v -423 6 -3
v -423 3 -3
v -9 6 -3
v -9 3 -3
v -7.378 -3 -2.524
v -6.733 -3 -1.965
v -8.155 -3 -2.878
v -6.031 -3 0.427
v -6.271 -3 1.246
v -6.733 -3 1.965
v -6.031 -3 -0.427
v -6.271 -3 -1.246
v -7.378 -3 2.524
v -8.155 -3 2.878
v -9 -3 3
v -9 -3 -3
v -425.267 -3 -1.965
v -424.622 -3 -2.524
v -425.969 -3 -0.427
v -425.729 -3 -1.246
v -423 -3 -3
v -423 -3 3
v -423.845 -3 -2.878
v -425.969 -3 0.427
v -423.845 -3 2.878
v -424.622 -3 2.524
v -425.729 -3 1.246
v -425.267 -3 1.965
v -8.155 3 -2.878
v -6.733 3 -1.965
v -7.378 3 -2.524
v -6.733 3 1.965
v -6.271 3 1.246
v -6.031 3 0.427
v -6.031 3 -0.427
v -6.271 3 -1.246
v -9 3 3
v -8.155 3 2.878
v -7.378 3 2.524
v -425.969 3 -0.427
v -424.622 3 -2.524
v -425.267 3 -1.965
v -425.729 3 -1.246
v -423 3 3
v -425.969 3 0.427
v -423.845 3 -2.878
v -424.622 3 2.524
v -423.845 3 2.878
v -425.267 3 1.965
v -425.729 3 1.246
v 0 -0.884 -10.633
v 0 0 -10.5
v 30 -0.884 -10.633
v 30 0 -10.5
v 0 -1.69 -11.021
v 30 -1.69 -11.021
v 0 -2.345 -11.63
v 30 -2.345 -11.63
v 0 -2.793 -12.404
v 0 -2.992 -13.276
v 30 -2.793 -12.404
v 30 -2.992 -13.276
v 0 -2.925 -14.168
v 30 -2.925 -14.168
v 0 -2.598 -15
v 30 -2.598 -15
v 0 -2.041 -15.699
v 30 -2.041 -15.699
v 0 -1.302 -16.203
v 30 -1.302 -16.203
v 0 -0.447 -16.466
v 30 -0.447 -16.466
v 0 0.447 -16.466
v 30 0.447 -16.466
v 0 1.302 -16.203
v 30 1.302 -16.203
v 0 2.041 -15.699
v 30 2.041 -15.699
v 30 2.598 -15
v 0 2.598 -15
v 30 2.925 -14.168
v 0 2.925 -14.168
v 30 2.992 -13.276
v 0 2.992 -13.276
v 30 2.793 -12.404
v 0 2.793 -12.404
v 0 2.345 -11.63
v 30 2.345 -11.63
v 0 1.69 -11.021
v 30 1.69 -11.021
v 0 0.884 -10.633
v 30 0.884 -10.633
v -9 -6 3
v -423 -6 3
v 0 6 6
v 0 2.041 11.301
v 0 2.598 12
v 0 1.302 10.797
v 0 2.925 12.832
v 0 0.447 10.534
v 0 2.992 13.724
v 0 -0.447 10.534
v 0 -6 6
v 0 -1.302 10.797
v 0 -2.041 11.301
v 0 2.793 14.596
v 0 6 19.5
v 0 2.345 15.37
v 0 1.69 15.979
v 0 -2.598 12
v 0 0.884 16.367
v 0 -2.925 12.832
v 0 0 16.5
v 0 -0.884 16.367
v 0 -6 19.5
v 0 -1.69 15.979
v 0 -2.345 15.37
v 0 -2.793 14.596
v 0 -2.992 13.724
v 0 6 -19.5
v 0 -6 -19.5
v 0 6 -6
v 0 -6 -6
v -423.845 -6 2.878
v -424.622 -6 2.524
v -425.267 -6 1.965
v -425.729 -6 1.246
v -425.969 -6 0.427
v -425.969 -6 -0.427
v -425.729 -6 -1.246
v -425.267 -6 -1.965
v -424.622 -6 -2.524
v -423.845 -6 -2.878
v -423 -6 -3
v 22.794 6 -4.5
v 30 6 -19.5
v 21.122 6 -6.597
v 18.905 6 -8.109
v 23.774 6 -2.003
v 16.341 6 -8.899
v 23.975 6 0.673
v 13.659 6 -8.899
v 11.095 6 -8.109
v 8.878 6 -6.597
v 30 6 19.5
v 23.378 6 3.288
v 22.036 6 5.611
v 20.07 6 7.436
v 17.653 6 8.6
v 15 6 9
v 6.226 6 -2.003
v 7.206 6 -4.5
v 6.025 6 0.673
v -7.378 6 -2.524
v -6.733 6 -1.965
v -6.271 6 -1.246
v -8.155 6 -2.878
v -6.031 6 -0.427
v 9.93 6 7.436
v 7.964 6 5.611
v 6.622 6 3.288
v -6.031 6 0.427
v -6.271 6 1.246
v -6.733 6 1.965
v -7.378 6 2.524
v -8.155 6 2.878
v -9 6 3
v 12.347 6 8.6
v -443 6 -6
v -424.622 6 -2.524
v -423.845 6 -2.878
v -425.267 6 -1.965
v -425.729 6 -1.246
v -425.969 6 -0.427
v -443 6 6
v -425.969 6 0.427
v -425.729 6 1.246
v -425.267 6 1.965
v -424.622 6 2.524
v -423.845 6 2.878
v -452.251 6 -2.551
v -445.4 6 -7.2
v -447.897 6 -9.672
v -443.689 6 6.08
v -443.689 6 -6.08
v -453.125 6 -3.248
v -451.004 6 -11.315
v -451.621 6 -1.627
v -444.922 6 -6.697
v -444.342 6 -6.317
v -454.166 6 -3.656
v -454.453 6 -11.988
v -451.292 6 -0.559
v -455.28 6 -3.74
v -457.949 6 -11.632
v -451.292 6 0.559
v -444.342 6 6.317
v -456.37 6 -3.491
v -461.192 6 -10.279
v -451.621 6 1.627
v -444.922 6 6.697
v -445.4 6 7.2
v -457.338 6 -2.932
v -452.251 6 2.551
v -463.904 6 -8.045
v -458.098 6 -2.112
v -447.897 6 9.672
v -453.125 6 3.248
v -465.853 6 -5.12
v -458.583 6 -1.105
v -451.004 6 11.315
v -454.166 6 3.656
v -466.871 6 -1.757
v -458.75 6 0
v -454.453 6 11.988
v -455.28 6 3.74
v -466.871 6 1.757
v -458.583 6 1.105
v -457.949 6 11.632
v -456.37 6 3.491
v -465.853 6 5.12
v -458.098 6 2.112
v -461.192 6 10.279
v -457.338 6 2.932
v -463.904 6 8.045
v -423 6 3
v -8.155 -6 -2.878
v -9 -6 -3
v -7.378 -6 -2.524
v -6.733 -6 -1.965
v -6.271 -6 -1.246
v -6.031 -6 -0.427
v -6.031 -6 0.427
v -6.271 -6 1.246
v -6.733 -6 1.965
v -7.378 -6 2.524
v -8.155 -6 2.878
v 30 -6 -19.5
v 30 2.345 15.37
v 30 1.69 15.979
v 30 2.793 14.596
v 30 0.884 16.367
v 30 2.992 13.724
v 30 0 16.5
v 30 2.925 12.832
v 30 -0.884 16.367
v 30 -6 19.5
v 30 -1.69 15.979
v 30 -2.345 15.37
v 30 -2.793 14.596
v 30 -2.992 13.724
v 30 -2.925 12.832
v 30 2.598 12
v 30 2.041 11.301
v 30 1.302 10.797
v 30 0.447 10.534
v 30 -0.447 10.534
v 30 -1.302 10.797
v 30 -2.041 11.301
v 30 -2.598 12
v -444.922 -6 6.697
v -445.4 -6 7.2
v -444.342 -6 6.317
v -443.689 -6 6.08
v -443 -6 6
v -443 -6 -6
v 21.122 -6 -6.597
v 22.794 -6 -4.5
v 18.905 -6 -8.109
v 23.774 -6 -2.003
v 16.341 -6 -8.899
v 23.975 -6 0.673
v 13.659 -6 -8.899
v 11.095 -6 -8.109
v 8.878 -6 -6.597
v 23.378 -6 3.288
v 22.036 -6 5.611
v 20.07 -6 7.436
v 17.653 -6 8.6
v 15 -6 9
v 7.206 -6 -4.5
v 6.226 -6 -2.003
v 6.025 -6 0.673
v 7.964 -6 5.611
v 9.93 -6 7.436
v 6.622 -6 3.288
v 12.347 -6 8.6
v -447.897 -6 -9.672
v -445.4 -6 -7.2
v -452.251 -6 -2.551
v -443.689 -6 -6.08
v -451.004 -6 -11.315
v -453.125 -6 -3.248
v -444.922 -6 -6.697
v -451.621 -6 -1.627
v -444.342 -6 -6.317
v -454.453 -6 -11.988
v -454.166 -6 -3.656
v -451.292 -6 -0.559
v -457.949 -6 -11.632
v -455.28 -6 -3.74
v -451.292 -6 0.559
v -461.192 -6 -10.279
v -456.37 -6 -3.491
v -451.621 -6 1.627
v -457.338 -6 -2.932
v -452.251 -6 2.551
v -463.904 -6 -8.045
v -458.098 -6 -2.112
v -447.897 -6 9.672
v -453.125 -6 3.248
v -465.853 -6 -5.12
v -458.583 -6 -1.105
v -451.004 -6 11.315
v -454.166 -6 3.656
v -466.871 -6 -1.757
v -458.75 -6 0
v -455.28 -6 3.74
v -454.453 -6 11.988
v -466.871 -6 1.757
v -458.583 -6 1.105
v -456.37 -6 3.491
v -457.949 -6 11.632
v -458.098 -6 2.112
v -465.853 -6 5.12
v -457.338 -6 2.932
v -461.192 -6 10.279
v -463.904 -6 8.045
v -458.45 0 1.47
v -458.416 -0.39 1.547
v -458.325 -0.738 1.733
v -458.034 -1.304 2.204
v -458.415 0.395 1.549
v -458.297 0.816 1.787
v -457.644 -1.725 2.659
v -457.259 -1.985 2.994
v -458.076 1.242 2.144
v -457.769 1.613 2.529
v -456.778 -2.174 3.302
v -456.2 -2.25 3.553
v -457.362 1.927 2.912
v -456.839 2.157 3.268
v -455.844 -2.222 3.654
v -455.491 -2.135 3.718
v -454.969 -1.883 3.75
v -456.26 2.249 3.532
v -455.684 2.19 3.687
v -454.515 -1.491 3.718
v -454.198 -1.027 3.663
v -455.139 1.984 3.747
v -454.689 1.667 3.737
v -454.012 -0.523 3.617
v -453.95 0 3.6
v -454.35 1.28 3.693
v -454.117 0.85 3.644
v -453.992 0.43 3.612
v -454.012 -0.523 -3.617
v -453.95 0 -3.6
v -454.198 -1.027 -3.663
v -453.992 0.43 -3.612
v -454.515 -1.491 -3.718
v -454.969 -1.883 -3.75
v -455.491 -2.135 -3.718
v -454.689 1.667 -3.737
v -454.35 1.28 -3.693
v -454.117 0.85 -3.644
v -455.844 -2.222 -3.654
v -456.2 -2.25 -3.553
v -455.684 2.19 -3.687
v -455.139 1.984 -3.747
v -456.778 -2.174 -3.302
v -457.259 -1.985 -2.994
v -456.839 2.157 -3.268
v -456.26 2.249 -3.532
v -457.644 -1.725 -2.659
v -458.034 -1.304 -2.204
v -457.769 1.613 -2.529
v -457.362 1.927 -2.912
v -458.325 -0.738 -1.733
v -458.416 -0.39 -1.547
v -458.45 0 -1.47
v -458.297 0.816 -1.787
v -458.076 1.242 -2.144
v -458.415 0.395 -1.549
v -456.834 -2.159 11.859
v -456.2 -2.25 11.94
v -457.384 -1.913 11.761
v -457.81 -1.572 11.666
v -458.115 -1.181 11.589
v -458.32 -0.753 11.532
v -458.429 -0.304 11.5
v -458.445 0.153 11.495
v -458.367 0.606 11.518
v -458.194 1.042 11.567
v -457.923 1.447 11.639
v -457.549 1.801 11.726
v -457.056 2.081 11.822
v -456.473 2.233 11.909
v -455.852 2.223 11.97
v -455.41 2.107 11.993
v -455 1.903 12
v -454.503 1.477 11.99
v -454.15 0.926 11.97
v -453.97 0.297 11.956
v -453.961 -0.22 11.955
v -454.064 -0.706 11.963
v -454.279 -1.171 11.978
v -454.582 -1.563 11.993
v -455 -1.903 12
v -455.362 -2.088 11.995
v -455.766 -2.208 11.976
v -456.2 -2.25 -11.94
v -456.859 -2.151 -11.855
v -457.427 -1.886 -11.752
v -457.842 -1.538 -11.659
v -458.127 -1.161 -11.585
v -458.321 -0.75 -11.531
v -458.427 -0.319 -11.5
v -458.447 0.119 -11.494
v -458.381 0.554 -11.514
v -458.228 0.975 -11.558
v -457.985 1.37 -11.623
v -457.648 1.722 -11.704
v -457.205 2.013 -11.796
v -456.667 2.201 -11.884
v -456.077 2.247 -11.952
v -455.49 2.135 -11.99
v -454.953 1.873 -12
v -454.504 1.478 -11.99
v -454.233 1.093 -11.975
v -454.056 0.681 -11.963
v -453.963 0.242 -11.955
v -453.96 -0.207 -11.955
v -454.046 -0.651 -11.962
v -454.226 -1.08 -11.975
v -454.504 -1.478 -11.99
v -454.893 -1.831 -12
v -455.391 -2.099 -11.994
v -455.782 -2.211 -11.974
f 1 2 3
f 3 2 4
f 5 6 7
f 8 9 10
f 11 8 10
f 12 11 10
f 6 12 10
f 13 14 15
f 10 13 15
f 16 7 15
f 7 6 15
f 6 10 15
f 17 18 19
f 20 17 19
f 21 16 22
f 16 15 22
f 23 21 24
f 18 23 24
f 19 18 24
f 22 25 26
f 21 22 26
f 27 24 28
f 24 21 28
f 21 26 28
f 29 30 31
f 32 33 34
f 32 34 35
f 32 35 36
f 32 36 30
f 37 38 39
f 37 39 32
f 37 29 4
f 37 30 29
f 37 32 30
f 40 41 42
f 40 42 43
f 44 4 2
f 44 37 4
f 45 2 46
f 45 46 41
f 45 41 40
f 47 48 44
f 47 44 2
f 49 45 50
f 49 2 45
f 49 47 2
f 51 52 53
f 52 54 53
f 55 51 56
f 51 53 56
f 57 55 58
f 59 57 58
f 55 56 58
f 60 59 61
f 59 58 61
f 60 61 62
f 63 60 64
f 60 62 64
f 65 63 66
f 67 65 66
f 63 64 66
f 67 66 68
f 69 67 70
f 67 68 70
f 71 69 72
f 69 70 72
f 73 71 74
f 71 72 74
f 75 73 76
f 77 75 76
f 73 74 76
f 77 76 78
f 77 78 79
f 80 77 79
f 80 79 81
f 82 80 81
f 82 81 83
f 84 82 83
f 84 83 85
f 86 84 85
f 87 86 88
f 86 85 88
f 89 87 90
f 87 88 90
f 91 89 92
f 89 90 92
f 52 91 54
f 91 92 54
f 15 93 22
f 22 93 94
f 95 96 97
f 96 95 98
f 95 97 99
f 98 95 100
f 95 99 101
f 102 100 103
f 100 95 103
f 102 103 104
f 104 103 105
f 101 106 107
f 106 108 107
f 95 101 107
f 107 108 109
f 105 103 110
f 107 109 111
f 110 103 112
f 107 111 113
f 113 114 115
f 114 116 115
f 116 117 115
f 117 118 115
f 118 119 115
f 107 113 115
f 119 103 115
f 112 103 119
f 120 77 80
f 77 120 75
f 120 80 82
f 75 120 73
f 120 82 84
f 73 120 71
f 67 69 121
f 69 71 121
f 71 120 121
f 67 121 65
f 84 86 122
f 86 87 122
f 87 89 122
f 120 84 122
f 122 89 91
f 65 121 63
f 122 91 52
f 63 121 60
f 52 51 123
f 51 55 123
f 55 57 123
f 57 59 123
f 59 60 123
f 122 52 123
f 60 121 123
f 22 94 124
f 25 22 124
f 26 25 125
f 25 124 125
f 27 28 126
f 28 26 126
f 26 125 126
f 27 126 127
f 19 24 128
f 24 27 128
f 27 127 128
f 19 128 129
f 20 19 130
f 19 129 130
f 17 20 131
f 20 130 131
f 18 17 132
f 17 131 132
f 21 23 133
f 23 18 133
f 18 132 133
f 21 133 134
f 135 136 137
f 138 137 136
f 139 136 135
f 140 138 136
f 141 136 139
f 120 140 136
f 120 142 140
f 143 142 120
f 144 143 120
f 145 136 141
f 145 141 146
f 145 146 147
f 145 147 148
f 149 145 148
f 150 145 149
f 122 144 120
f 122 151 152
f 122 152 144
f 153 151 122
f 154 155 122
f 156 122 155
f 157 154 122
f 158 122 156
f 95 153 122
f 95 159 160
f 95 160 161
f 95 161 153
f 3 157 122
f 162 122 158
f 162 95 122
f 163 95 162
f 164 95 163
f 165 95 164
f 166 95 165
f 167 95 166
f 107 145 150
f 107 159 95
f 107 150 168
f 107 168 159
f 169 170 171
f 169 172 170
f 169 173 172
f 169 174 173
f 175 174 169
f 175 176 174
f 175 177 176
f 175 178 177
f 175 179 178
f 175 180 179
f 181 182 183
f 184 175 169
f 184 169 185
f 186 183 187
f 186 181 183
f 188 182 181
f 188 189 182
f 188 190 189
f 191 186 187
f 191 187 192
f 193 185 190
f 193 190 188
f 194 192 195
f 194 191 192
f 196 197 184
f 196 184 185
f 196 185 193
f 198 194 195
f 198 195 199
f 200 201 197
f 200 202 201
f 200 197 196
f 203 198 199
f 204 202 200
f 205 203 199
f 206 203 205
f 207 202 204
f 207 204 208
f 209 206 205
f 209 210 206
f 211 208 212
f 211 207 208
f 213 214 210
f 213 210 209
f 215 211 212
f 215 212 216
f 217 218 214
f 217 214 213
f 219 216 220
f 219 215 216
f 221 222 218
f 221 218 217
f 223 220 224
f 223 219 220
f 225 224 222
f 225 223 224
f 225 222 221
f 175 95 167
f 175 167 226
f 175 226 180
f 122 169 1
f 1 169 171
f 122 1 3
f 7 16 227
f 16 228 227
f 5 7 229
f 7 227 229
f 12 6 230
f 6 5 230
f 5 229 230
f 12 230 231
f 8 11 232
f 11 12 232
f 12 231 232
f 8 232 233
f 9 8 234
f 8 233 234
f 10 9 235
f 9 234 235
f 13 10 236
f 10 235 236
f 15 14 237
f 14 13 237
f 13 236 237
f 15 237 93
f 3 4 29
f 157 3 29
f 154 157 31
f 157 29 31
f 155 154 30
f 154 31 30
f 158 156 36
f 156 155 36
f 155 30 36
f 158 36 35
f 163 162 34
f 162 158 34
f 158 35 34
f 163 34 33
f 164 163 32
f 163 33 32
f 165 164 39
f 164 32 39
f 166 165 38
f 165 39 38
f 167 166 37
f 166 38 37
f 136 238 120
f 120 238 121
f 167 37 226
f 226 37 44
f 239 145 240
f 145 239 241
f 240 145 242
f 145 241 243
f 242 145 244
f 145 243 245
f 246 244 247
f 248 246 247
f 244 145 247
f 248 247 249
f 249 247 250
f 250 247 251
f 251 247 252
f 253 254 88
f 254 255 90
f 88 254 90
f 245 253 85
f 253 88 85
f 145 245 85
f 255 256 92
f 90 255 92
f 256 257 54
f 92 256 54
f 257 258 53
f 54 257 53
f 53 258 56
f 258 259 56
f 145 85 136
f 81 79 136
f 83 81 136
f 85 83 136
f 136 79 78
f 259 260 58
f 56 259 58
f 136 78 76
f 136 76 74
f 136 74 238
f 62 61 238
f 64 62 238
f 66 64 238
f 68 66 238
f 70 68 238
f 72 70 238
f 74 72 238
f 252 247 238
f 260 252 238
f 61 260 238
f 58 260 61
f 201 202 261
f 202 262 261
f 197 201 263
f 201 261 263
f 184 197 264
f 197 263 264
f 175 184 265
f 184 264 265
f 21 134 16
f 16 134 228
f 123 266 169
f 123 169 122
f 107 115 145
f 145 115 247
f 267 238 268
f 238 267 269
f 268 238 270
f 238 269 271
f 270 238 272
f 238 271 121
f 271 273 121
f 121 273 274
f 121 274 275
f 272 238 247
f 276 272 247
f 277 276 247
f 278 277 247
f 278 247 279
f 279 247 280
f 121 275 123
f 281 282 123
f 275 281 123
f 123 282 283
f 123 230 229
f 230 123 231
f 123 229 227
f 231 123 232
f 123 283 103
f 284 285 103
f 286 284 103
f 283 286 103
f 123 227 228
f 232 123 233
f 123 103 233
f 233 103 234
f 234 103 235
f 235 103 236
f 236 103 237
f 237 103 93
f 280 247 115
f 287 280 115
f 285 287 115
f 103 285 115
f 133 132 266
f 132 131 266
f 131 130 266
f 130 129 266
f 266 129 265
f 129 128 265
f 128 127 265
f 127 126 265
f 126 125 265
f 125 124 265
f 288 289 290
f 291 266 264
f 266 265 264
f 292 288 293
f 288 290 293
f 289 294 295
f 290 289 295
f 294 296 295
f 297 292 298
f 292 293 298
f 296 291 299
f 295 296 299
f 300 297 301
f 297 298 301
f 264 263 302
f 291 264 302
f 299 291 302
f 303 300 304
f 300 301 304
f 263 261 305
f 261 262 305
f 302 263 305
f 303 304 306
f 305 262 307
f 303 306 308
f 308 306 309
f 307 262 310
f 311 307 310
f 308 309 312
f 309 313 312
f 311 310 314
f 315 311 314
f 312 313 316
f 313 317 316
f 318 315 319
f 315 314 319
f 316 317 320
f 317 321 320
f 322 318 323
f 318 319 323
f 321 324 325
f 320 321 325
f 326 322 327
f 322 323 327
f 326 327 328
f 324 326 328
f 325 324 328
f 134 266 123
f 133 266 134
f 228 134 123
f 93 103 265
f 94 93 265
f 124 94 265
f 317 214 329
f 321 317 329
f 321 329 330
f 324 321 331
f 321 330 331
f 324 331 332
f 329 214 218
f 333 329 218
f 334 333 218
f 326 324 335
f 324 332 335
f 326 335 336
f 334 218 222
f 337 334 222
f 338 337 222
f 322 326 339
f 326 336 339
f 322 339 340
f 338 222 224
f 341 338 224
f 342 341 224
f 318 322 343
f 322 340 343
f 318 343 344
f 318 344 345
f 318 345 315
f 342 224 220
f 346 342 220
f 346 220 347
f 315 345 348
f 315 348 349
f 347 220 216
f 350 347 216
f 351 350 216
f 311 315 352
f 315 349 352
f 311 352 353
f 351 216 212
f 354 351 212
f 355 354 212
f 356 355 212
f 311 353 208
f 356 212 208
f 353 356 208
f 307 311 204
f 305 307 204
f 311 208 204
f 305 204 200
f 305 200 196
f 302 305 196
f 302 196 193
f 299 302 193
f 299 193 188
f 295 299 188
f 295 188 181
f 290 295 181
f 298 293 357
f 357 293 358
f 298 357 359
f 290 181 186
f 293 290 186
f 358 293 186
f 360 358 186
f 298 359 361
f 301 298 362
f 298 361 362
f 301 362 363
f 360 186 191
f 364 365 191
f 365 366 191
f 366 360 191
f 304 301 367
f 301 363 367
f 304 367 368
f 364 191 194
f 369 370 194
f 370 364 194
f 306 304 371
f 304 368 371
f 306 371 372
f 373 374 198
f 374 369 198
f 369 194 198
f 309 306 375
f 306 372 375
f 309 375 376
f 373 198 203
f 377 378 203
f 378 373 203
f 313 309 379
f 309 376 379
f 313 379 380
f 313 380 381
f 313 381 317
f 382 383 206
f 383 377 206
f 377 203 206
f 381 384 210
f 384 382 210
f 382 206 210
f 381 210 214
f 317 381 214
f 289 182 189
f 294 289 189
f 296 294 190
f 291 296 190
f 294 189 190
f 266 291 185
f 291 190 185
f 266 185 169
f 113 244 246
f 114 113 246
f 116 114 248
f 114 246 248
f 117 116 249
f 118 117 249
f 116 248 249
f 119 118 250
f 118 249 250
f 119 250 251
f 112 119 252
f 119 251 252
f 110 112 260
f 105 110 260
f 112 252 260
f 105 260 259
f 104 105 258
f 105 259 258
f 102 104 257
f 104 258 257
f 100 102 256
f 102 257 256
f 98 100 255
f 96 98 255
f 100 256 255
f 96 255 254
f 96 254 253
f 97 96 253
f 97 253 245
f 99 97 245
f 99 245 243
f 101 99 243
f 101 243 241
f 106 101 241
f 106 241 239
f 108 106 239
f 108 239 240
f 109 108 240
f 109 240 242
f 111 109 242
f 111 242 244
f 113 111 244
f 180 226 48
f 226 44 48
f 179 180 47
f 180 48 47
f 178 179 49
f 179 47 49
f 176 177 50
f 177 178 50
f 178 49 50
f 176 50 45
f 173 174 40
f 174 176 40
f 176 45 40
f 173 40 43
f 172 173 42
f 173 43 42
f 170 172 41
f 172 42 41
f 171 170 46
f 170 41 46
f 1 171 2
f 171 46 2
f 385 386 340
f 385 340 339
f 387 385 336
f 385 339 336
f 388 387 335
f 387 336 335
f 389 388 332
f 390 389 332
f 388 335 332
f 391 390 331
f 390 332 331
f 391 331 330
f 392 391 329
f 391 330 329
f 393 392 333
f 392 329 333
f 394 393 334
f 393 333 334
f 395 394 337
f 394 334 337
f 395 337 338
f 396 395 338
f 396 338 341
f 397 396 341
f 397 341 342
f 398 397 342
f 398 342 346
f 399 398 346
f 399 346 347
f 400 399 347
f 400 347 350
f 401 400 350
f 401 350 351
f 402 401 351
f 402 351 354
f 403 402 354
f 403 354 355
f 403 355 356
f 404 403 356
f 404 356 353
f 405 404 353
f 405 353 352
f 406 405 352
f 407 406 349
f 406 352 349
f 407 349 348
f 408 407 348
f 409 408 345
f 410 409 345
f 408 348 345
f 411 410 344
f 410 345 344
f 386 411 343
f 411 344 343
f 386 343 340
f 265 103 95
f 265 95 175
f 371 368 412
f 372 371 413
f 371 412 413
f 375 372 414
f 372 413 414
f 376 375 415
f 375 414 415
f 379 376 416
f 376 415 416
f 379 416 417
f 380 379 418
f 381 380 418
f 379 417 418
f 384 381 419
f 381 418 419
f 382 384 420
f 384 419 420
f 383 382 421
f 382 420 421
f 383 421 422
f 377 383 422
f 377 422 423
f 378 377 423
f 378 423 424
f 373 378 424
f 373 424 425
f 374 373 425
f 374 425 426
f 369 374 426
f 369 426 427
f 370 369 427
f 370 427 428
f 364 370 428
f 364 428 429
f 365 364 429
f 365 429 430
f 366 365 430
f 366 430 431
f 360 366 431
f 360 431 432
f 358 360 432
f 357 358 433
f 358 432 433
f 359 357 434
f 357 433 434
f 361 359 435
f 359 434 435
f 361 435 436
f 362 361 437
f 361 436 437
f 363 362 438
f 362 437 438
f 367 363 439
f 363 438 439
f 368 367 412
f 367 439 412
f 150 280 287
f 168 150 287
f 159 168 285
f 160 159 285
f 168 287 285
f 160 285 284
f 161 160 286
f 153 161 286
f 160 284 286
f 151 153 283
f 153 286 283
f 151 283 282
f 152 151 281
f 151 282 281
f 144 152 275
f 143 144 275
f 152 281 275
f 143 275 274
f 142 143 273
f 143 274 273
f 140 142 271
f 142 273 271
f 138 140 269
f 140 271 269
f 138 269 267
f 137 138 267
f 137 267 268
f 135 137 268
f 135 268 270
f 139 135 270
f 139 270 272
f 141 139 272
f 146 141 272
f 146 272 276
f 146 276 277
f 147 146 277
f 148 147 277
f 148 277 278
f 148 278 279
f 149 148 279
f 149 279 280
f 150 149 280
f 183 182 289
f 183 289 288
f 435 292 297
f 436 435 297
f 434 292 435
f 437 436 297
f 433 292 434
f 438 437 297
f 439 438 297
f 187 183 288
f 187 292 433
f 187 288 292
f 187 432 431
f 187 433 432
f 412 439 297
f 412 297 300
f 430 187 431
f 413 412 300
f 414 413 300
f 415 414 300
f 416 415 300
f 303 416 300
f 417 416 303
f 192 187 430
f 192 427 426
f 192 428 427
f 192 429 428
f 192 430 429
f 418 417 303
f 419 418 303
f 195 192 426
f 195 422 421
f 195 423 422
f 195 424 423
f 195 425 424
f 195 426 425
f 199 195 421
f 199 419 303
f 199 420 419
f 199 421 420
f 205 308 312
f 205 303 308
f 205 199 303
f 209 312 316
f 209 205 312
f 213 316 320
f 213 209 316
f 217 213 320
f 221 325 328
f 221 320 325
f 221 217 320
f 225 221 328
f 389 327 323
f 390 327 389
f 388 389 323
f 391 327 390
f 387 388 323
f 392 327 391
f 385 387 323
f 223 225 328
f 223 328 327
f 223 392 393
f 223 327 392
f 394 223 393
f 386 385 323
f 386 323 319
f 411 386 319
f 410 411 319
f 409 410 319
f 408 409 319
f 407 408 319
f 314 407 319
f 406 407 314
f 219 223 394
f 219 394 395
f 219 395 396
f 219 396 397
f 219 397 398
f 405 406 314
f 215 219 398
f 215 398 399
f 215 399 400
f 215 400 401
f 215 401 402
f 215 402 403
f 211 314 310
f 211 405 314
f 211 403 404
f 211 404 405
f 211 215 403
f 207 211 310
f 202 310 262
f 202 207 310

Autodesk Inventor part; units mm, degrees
ref_plane "YZ Plane" through (0, 0, 0) normal (1, 0, 0) x (0, 1, 0)
sketch "Skizze1" plane through (0, 0, 0) normal (0, 1, 0) x (-1, 0, 0)
  line L0 (0, 19.5) -> (-30, 19.5)
  line L1 (-30, 19.5) -> (-30, -19.5)
  line L2 (-30, -19.5) -> (0, -19.5)
  line L3 (0, -19.5) -> (0, 19.5)
  line L4 (0, 6) -> (455, 6)
  line L5 (455, 6) -> (455, -6)
  line L6 (455, -6) -> (0, -6)
  line L7 (0, -6) -> (0, 6)
  line L8 (0, 0) -> (-64.3399, 0) construction
  line L9 (9, 0) -> (423, 0) construction
  line L10 (9, 3) -> (423, 3)
  line L11 (423, -3) -> (9, -3)
  arc A0 (9, 3) -> (9, -3) centre (9, 0) ccw
  arc A1 (423, -3) -> (423, 3) centre (423, 0) ccw
  point P0 (455, 0)
  point P1 (-15, -19.5)
  point P2 (216, 0)
  point P3 (6, 0)
  point P4 (426, 0)
  dimension "d0" = 39
  dimension "d1" = 30
  dimension "d2" = 470
  dimension "d3" = 12
  dimension "d4" = 6
  dimension "d5" = 6
  dimension "d6" = 3
  dimension "d27" = 420
extrude "Extrusion1" add sketch "Skizze1" along normal mid plane 12
extrude "Extrusion2" add sketch "Skizze1" along normal blind 3 contours L10 A1 L11 A0
extrude "Extrusion3" add sketch "Skizze1" against normal blind 3 contours L10 A1 L11 A0
sketch "Skizze2" plane through (0, 6, 0) normal (0, 1, 0) x (1, 0, 0)
  line L0 (30, 19.5) -> (0, 19.5) projected
  point P0 (0, 0)
  point P1 (15, 0)
  point P2 (15, 19.5)
hole "Bohrung1" at (15, 6, 0) direction (0, -1, 0) diameter 18 depth 12
ref_plane "Arbeitsebene1" through (0, 0, 0) normal (0, 1, 0) x (-1, 0, 0)
sketch "Skizze4" plane through (0, 0, 0) normal (0, 1, 0) x (-1, 0, 0)
  line L0 (455, 6) -> (455, -6) projected
  circle A0 centre (455, 0) radius 12
  point P0 (0, 0)
  dimension "d24" = 24
extrude "Extrusion4" add sketch "Skizze4" along normal mid plane 12
sketch "Skizze5" plane through (0, 0, 0) normal (0, 1, 0) x (-1, 0, 0)
  circle A0 centre (455, 0) radius 3.75
  arc A1 (444.6077, -6) -> (444.6077, 6) centre (455, 0) ccw projected
  point P0 (0, 0)
  dimension "d28" = 7.5
extrude "Extrusion5" cut sketch "Skizze5" along normal mid plane 12
fillet "Rundung1" radius 3 2 edges at (-444.6077, 0, 6) (-444.6077, 0, -6)
ref_plane "Arbeitsebene2" through (0, 0, 12) normal (0, 0, 1) x (1, 0, 0)
sketch "Skizze6" plane through (0, 0, 12) normal (0, 0, 1) x (1, 0, 0)
  line L0 (-467, -6) -> (-467, 6) projected
  line L1 (-445.4, -6) -> (-445.4, 6) projected
  line L2 (-445.4, -6) -> (-445.4, -6) projected
  line L3 (-445.4, 6) -> (-445.4, -6) projected
  line L4 (-445.4, 6) -> (-445.4, 6) projected
  line L5 (-445.4, 6) -> (-467, 6) projected
  point P0 (0, 0)
  point P1 (-456.2, 0)
  point P2 (-467, 0)
  point P3 (-456.2, 6)
hole "Bohrung2" at (-456.2, 0, 12) direction (0, 0, -1) diameter 4.5 end through all
sketch "Skizze7" plane through (0, -6, 19.5) normal (-1, 0, 0) x (0, 0, 1)
  line L0 (-15.75, 0) -> (-23.25, 0) projected
  line L1 (-25.5, 0) -> (-39, 0) projected
  line L2 (-39, 0) -> (0, 0) projected
  line L3 (0, 0) -> (-13.5, 0) projected
  line L4 (-12.3, 0) -> (-13.5, 0) projected
  line L5 (-12.3, 0) -> (-26.7, 0) projected
  line L6 (-25.5, 0) -> (-26.7, 0) projected
  line L7 (-22.5, 0) -> (-16.5, 0) projected
  line L8 (-16.5, 0) -> (-22.5, 0) projected
  line L9 (-10.5, 0) -> (-28.5, 0) projected
  point P0 (-19.5, 6)
  point P1 (-6, 6)
  point P2 (-33, 6)
  point P3 (-6.75, 0)
  dimension "d48" = 6
  dimension "d50" = 13.5
  dimension "d51" = 13.5
hole "Bohrung3" at (0, 0, 13.5) at (0, 0, -13.5) direction (1, 0, 0) diameter 6 end through all
equation "\"d51\" = d50"
properties part number "pleuel_rad" material "Messing, weicher Gelbton"
